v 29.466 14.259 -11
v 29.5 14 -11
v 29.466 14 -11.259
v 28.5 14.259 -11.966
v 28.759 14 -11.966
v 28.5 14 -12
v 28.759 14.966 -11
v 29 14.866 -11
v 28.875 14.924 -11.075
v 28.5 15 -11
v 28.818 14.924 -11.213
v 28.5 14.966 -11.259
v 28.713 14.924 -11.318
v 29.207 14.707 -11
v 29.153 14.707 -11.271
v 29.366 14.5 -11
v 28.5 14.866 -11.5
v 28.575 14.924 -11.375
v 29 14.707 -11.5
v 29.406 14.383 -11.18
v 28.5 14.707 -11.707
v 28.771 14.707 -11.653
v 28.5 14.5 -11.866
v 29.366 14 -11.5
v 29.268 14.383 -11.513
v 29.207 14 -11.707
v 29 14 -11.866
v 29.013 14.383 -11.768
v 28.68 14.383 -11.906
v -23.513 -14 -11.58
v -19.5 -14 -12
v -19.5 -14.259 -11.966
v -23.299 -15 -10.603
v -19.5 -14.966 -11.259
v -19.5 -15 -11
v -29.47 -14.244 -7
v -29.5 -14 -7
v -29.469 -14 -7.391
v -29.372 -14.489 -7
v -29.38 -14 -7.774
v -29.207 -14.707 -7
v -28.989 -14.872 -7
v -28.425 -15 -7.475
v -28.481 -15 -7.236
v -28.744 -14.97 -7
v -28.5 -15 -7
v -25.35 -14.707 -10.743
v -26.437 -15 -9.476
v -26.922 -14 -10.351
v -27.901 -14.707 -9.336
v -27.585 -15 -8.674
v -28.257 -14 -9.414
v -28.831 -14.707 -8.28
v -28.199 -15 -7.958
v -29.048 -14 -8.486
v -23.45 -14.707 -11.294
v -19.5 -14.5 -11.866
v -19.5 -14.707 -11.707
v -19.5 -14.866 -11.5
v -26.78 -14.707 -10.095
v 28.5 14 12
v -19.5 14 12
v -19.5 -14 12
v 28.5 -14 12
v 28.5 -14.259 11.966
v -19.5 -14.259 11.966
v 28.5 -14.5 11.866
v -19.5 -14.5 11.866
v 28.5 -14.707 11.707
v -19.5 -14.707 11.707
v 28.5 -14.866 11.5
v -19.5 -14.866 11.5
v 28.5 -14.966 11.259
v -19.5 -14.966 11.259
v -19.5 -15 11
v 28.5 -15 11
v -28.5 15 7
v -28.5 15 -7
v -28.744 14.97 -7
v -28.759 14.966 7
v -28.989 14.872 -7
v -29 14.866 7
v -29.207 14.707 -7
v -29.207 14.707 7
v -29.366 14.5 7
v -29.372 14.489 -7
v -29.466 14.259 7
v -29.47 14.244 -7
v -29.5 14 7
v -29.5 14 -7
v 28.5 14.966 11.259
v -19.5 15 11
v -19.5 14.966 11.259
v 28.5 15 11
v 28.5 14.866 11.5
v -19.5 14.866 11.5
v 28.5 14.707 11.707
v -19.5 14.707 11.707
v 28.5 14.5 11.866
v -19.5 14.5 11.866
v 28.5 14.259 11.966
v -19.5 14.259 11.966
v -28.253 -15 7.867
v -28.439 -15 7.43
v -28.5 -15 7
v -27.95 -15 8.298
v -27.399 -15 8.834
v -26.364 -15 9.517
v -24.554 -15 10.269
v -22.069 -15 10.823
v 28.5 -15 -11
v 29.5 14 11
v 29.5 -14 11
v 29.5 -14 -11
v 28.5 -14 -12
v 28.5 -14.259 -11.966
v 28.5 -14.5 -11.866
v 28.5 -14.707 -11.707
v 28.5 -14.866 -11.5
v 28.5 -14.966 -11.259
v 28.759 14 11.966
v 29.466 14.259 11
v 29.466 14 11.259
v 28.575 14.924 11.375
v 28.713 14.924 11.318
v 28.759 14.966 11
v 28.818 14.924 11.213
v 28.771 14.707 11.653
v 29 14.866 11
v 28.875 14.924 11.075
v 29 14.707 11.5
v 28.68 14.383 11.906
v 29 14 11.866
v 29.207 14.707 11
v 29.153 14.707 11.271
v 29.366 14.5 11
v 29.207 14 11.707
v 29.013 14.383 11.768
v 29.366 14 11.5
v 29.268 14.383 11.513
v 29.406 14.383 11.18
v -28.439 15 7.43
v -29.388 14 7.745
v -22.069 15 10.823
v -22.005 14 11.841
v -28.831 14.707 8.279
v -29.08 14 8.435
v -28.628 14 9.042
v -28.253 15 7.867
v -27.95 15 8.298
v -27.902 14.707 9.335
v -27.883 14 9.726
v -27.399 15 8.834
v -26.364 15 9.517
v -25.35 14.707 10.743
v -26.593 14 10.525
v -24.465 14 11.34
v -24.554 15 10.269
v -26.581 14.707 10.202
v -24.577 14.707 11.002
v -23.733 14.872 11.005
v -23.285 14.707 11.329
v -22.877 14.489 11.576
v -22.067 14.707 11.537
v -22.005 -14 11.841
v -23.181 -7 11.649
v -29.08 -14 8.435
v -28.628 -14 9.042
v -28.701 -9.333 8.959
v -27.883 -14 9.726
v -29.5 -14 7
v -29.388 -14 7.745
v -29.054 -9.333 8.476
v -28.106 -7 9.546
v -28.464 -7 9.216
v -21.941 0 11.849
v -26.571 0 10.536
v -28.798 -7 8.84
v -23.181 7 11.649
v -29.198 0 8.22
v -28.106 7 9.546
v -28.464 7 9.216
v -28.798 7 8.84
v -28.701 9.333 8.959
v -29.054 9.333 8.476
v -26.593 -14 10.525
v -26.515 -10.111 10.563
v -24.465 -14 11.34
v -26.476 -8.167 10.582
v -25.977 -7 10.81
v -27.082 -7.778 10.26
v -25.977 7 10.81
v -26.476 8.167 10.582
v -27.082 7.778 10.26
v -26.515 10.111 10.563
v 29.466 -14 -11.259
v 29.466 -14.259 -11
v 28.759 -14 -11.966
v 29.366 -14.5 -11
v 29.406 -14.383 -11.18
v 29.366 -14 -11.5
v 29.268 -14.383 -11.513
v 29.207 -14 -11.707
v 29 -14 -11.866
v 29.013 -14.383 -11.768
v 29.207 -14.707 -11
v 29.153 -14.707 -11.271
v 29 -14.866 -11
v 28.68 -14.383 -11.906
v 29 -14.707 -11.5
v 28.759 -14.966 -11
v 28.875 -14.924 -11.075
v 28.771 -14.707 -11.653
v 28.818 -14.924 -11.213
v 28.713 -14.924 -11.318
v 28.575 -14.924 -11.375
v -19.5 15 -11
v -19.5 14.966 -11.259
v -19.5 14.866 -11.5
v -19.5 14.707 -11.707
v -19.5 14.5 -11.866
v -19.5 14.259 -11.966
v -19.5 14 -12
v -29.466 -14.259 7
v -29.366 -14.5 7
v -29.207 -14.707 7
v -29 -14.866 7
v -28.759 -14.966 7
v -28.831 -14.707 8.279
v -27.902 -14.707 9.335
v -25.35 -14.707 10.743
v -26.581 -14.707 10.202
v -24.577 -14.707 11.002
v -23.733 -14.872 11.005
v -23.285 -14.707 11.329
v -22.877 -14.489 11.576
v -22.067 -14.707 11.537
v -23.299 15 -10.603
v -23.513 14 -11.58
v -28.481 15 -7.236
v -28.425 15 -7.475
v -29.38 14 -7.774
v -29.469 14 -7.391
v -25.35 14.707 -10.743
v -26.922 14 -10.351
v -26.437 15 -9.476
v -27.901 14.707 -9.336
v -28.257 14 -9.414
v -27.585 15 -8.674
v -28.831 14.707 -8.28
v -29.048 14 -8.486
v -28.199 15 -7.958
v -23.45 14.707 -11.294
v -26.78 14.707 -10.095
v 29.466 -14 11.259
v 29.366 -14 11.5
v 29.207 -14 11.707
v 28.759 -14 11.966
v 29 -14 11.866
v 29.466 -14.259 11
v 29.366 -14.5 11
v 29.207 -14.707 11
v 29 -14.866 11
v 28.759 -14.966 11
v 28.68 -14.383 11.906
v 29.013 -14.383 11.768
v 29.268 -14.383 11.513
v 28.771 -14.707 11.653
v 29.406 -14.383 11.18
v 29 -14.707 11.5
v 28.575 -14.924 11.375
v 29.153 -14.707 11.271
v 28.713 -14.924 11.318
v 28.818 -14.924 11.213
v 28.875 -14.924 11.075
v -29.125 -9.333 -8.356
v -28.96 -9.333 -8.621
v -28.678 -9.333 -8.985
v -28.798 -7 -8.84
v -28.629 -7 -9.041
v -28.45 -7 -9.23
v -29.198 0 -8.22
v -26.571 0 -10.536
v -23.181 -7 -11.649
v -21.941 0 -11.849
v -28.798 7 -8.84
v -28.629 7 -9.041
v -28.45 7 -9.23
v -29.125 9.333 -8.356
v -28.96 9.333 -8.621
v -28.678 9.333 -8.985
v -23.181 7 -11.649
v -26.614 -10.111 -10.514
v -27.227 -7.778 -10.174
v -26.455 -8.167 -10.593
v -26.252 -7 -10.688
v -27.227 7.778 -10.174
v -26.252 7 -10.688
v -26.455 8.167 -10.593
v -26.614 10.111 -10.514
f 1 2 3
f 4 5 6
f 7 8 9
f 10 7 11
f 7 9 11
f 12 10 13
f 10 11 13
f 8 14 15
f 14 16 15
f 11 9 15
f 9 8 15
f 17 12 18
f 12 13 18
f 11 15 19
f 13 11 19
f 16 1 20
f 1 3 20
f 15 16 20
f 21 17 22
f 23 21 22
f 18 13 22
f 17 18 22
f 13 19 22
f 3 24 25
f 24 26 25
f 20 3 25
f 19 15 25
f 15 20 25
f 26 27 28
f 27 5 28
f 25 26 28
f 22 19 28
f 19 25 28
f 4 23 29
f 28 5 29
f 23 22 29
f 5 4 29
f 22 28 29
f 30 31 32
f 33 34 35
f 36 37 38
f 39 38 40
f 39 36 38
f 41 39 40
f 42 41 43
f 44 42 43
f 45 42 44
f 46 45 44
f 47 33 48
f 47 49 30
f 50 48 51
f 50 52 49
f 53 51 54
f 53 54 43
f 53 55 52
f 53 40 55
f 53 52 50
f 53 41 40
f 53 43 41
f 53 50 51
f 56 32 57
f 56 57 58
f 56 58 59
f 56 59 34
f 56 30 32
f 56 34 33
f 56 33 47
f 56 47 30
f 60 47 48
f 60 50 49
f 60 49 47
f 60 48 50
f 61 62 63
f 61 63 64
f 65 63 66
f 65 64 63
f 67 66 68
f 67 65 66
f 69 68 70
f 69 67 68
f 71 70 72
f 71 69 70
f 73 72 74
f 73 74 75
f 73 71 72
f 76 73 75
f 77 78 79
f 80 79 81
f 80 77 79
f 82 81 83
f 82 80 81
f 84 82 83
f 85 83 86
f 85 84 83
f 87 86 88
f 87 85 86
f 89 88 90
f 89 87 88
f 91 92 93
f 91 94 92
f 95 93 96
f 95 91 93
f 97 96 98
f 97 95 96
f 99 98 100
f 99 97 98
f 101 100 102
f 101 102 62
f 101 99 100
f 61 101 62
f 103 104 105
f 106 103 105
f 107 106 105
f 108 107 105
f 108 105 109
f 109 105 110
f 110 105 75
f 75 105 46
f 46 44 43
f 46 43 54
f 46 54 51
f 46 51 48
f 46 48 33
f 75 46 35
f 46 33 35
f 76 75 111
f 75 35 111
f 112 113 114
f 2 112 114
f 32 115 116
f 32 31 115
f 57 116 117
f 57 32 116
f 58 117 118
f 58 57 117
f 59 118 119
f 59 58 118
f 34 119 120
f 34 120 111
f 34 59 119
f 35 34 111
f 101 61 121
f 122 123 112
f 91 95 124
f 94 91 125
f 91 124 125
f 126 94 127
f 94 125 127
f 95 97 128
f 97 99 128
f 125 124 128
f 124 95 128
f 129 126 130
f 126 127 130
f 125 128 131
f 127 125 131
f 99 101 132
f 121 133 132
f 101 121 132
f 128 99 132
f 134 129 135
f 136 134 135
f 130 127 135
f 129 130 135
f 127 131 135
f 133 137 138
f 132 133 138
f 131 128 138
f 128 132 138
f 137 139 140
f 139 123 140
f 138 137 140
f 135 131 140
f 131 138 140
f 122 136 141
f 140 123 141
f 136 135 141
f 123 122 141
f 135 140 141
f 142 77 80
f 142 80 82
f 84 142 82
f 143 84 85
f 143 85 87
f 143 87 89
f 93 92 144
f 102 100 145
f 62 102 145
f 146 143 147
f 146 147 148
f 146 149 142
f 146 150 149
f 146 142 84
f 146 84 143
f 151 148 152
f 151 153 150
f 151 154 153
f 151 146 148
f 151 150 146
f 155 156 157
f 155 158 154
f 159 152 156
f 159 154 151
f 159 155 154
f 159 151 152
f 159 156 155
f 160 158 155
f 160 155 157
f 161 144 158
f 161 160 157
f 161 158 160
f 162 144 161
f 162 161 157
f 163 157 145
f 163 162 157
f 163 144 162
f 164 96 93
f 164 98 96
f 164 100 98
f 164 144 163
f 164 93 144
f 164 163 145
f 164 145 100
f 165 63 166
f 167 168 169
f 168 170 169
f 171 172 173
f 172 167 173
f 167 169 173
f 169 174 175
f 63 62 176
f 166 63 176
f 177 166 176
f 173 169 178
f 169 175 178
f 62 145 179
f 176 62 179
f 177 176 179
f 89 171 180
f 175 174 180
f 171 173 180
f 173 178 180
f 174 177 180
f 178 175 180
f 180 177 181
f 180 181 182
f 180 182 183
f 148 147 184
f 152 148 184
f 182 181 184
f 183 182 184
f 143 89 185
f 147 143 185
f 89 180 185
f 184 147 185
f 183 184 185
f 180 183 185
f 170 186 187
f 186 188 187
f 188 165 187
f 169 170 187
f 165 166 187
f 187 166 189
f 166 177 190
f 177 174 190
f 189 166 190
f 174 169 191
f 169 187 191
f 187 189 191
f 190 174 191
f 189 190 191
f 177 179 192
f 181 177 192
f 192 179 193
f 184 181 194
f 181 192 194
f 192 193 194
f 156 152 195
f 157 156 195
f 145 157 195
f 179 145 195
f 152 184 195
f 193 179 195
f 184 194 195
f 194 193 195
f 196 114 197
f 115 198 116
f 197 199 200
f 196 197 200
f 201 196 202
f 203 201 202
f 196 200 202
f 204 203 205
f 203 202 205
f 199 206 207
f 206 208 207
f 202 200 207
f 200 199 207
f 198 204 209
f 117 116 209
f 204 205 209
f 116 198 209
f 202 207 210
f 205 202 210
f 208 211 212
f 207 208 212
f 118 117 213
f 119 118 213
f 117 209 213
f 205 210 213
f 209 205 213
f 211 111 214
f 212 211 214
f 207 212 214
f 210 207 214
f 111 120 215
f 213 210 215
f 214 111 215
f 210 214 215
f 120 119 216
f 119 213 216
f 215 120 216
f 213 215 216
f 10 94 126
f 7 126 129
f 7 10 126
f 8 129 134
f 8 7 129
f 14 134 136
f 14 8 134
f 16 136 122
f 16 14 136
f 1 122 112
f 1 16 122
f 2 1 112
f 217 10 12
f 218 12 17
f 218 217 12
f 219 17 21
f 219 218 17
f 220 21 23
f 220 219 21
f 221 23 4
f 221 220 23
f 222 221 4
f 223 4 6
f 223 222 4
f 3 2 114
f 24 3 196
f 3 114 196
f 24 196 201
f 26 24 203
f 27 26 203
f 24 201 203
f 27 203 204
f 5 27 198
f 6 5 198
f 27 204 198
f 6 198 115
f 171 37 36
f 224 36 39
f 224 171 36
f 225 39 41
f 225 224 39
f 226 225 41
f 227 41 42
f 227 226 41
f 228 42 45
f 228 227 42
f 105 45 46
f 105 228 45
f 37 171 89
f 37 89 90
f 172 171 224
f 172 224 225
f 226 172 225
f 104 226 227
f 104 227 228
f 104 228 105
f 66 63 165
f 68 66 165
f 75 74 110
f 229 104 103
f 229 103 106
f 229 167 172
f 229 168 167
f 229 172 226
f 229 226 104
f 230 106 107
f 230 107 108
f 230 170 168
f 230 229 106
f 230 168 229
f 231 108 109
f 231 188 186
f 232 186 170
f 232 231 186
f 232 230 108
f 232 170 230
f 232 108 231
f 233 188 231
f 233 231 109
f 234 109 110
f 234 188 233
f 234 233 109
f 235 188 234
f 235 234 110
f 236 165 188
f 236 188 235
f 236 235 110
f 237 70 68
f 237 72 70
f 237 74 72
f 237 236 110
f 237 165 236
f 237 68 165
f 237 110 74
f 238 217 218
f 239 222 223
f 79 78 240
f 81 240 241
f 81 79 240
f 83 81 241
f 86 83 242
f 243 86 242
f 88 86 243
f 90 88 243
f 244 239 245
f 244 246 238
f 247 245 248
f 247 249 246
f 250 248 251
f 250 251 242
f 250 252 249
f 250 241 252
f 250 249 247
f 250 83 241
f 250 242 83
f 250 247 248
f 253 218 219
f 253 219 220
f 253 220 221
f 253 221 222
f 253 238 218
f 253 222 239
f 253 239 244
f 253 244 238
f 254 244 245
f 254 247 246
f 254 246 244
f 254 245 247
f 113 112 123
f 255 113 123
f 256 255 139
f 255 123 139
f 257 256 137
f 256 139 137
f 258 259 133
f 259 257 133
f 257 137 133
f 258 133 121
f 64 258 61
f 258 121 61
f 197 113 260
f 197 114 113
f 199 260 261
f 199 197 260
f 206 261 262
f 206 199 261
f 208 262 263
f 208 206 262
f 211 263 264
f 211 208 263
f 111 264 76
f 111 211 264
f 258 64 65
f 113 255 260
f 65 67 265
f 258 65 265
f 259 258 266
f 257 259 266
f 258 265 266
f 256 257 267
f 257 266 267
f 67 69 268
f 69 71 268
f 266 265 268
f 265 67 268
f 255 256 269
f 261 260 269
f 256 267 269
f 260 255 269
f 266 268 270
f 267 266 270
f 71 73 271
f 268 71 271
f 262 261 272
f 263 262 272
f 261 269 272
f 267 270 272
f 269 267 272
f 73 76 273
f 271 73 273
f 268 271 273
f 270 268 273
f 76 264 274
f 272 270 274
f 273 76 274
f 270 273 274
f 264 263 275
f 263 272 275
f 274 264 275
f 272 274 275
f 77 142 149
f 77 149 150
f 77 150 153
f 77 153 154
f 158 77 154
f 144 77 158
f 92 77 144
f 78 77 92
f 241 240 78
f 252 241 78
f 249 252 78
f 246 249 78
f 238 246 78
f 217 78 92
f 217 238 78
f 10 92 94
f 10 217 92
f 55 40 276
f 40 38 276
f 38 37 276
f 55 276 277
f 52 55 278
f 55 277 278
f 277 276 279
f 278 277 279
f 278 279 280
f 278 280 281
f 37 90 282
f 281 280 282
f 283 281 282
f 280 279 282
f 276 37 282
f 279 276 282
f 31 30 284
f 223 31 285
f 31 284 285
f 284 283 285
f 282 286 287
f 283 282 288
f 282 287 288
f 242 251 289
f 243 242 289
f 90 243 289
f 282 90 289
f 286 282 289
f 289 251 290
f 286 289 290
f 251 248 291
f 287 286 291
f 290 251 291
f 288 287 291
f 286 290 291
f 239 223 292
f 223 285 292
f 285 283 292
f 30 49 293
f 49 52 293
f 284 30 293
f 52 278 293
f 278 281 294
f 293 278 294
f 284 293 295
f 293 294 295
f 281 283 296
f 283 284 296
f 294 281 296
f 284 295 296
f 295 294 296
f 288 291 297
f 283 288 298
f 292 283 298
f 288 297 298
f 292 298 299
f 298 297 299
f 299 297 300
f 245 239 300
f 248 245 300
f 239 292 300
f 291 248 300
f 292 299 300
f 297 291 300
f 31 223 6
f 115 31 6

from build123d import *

# Parameters (mm, degrees)
SKETCH1_W           = 59
SKETCH1_H           = 24
BOSS_EXTRUDE1_DEPTH = 15
FILLET1_R           = 1
FILLET2_SIZE        = 5
FILLET2_SIZE_2      = 10
FILLET3_R           = 1


with BuildPart() as part:
    # Sketch1 → Boss-Extrude1 (new, symmetric)
    with BuildSketch(Plane(origin=(0, 0, 0), x_dir=(1, 0, 0), z_dir=(0, 1, 0))):
        Rectangle(SKETCH1_W, SKETCH1_H)
    extrude(amount=BOSS_EXTRUDE1_DEPTH, both=True)

    # Fillet1
    fillet1_edges = [part.edges().sort_by_distance(p)[0] for p in [
        (29.5, 0, 12),
        (29.5, 0, -12),
    ]]
    fillet(fillet1_edges, radius=FILLET1_R)

    # Fillet2
    # an asymmetric fillet: 10, 5 mm, written as the material it takes off along each edge
    with BuildSketch(Plane(origin=(-29.5, 40, -12), x_dir=(0, 0, 1), z_dir=(0, -1, 0))) as fillet2_piece_1:
        with BuildLine():
            Bezier((FILLET2_SIZE, 0), (0, 0), (0, -FILLET2_SIZE_2), weights=[1, 0.707106781, 1])
            Line((0, -FILLET2_SIZE_2), (0, 0))
            Line((0, 0), (FILLET2_SIZE, 0))
        make_face()
    extrude(amount=80, mode=Mode.SUBTRACT)
    with BuildSketch(Plane(origin=(-29.5, 40, 12), x_dir=(1, 0, 0), z_dir=(0, -1, 0))) as fillet2_piece_2:
        with BuildLine():
            Bezier((FILLET2_SIZE_2, 0), (0, 0), (0, -FILLET2_SIZE), weights=[1, 0.707106781, 1])
            Line((0, -FILLET2_SIZE), (0, 0))
            Line((0, 0), (FILLET2_SIZE_2, 0))
        make_face()
    extrude(amount=80, mode=Mode.SUBTRACT)

    # Fillet3
    fillet3_edges = [part.edges().sort_by_distance(p)[0] for p in [
        (-25.444718917, -15, 11.02058196),
        (-29.5, -15, 0),
        (-25.444718915, -15, -11.020581957),
        (4.5, -15, -12),
        (29.207106781, -15, -11.707106781),
        (29.5, -15, 0),
        (29.207106781, -15, 11.707106781),
        (-25.444718917, 15, 11.02058196),
        (-29.5, 15, 0),
        (-25.444718915, 15, -11.020581957),
        (4.5, 15, -12),
        (29.207106781, 15, -11.707106781),
        (29.5, 15, 0),
        (29.207106781, 15, 11.707106781),
        (4.5, -15, 12),
        (4.5, 15, 12),
    ]]
    fillet(fillet3_edges, radius=FILLET3_R)


solid = part.part
